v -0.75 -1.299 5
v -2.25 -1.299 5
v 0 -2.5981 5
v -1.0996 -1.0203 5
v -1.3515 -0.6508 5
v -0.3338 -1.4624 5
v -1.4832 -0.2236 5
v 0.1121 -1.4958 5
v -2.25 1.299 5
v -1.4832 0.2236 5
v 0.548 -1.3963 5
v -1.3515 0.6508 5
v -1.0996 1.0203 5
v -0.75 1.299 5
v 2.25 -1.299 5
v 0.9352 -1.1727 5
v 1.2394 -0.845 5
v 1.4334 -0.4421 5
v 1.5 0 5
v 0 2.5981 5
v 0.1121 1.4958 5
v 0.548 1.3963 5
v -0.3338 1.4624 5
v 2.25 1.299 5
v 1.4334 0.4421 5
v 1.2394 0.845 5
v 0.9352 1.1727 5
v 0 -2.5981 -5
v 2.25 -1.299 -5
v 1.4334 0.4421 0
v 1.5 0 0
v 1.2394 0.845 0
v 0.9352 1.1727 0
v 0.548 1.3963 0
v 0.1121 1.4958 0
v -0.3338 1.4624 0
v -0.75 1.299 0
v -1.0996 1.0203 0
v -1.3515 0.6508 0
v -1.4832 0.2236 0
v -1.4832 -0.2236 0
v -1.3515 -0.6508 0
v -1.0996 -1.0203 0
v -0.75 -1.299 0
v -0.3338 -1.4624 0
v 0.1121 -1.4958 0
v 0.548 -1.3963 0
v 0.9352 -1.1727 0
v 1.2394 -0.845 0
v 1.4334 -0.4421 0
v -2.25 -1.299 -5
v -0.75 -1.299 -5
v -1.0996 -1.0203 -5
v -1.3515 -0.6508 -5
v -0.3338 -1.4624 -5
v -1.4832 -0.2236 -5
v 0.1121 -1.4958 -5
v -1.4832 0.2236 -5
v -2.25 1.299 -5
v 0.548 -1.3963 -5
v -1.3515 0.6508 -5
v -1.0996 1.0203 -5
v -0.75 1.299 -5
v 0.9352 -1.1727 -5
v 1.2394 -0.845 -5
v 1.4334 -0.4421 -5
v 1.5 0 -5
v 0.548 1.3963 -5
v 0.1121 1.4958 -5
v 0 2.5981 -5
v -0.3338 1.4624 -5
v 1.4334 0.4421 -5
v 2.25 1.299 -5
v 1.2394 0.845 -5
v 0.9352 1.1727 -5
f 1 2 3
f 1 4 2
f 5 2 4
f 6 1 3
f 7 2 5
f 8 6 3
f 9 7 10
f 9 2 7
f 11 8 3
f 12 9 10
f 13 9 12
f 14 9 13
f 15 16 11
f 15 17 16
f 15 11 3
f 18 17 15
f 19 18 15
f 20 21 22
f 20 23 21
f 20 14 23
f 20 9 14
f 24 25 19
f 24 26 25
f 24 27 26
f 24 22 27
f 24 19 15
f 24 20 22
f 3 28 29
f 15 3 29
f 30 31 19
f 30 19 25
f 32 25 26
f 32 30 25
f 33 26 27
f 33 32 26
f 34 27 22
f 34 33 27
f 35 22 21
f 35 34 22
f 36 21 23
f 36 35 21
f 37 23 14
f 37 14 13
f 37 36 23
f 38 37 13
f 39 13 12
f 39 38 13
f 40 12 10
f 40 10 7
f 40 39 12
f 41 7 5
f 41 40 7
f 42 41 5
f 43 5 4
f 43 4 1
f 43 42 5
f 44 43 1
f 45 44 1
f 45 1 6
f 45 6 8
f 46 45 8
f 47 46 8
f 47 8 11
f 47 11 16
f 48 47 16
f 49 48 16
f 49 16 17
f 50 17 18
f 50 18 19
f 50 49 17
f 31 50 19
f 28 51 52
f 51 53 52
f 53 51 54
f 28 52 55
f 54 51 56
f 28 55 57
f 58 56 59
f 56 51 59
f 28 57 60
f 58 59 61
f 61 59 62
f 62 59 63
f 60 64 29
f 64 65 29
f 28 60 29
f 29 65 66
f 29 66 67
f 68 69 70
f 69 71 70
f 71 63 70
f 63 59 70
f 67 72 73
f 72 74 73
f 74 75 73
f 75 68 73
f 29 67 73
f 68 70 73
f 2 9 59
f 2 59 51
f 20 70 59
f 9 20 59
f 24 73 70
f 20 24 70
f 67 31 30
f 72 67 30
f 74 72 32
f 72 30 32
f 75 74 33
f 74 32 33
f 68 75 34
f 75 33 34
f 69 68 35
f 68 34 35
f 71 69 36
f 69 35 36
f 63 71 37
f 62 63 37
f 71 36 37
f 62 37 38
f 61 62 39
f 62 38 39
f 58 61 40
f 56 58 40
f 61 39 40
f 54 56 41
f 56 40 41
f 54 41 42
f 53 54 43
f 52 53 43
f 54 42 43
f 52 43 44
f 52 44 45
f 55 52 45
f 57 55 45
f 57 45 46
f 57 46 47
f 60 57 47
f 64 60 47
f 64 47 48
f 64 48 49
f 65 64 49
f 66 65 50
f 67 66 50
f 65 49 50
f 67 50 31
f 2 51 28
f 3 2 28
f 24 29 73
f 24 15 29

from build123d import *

# Parameters (mm, degrees)
SKETCH1_R           = 1.5
EXTRUDE1_DEPTH      = 5
EXTRUDE1_DEPTH_BACK = 5


with BuildPart() as part:
    # Sketch1 → Extrude1 (new body, two sides)
    with BuildSketch(Plane.XY) as extrude1_sk:
        Polygon((0, 2.598076211), (-2.25, 1.299038106), (-2.25, -1.299038106), (0, -2.598076211), (2.25, -1.299038106), (2.25, 1.299038106), align=None)
        Circle(SKETCH1_R, mode=Mode.SUBTRACT)
    extrude(amount=EXTRUDE1_DEPTH)
    extrude(extrude1_sk.sketch, amount=-EXTRUDE1_DEPTH_BACK)


solid = part.part
